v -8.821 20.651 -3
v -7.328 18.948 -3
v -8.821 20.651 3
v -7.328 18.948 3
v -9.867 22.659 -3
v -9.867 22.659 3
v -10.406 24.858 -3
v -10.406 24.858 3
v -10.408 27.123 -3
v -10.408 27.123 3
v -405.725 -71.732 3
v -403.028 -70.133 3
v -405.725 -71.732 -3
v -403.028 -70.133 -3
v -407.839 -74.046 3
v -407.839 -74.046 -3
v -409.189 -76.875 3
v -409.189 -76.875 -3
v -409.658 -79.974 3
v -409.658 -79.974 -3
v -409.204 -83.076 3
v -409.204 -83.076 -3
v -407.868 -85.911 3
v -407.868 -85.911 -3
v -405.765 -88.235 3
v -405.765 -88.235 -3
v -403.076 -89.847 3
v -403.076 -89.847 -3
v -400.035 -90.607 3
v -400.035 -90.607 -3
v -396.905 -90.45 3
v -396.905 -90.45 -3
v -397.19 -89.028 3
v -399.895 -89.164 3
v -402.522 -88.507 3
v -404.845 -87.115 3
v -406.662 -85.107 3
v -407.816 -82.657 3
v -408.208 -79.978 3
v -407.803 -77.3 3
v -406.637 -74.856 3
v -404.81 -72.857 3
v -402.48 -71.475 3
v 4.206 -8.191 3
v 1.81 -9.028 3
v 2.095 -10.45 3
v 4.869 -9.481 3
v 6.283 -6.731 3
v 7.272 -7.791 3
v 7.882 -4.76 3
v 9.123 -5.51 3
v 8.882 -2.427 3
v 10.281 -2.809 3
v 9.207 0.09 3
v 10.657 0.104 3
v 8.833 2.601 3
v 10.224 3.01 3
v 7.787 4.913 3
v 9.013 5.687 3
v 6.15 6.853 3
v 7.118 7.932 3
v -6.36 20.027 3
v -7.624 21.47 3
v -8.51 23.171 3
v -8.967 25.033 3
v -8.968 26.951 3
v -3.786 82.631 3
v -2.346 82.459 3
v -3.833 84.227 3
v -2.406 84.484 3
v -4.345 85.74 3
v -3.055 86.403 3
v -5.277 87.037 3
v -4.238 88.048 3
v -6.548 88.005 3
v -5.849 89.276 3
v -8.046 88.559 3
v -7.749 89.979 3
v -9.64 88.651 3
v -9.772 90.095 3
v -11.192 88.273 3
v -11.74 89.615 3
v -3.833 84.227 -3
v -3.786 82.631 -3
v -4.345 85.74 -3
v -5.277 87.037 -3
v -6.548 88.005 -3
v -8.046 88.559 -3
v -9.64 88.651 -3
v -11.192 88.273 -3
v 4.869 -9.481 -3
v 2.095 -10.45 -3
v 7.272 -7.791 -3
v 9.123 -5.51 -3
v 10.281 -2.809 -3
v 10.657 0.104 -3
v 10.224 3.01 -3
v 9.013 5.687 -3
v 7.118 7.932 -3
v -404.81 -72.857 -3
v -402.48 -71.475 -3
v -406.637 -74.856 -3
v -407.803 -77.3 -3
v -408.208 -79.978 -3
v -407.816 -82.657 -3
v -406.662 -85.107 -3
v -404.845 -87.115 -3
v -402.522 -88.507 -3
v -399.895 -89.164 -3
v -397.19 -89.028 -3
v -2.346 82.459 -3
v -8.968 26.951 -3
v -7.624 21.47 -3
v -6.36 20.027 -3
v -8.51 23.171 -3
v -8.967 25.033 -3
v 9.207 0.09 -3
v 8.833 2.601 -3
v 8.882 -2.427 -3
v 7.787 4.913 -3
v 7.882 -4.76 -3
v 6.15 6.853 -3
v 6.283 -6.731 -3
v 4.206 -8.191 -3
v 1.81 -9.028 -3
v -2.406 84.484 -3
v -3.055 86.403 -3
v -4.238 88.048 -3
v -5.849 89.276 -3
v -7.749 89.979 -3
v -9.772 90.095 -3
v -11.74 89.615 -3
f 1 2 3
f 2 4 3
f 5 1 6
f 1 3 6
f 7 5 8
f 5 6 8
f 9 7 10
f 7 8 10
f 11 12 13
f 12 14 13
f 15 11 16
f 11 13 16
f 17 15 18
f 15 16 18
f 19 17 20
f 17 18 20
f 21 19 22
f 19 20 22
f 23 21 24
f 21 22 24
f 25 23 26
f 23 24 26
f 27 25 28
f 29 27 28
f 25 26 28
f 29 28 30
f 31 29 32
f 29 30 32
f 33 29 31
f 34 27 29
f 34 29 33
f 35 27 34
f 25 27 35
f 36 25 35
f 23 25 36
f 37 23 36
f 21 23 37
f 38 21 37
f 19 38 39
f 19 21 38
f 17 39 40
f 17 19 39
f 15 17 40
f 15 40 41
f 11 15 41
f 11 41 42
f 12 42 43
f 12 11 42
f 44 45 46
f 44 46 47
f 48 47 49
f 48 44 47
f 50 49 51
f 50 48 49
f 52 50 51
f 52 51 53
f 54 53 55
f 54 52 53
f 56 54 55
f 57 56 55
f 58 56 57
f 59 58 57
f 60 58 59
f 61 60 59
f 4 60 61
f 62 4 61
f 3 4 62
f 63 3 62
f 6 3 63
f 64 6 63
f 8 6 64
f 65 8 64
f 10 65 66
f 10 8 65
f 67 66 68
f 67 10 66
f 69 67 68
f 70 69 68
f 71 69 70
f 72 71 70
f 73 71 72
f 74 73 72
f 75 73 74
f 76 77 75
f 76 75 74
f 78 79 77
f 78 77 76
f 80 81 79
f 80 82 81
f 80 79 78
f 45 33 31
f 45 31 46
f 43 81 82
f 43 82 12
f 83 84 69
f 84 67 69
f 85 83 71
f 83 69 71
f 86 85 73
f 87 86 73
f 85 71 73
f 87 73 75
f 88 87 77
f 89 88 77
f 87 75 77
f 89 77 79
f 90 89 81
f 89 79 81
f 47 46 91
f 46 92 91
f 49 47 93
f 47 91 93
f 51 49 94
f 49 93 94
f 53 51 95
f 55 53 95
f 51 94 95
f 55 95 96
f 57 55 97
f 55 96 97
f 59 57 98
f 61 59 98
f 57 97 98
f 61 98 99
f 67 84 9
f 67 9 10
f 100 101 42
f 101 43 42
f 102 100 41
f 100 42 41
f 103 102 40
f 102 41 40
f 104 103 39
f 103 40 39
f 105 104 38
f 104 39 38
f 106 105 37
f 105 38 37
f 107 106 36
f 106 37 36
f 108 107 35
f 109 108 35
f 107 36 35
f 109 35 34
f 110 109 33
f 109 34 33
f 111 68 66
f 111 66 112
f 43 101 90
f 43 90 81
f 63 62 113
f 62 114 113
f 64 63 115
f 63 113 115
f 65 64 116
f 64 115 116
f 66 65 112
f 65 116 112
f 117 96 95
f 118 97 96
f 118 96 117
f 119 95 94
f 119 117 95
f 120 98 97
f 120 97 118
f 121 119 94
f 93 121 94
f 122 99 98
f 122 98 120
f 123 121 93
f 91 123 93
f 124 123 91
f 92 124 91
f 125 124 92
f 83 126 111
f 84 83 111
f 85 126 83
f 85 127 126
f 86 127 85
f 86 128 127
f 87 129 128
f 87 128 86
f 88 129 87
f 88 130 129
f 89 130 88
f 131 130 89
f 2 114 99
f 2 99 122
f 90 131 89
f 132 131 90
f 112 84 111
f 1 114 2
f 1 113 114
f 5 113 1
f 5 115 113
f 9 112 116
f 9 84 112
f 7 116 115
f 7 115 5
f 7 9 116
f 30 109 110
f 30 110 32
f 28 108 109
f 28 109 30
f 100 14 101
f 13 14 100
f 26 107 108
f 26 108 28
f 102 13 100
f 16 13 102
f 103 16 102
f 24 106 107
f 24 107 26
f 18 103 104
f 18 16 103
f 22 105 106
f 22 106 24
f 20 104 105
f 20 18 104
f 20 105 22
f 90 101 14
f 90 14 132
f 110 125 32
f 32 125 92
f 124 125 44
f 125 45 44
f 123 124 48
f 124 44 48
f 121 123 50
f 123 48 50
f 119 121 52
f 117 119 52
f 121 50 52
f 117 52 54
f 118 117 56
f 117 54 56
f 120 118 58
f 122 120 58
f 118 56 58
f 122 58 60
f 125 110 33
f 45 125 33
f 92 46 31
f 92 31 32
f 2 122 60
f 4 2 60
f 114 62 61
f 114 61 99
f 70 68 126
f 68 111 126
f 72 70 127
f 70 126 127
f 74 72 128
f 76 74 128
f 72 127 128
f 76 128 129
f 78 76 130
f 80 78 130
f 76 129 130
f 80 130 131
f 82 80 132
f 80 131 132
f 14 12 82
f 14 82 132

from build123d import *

# Parameters (mm, degrees)
SKETCH4_W = 6
SKETCH4_H = 1.45


with BuildPart() as part:
    # Sweep1: sweep along a path in Sketch2
    with BuildLine(Plane.XY) as sweep1_path:
        Line((6.634008087, 7.392396345), (-6.844115698, 19.487795186))
        ThreePointArc((-6.844115698, 19.487795186), (-9.188071123, 22.914875813), (-9.688379476, 27.036610909))
        Line((-9.688379476, 27.036610909), (-3.065681286, 82.544917251))
        ThreePointArc((-3.065681286, 82.544917251), (-5.437015562, 88.14522378), (-11.466030466, 88.943746635))
        Line((-11.466030466, 88.943746635), (-402.754294044, -70.804193152))
        ThreePointArc((-402.754294044, -70.804193152), (-408.510077554, -82.86635865), (-397.047352934, -89.738827246))
        Line((-397.047352934, -89.738827246), (1.95264707, -9.738827262))
        ThreePointArc((1.95264707, -9.738827262), (9.58135519, -2.618247459), (6.634008087, 7.392396345))
    # Sketch4 → Sweep1 (sweep)
    with BuildSketch(Plane(origin=(0, 0, 0), x_dir=(0, 0, 1), z_dir=(0.9804860480377625, 0.1965886812695244, 0))):
        with Locations((0, 9.932652567)):
            Rectangle(SKETCH4_W, SKETCH4_H)
    sweep(path=sweep1_path.line)


solid = part.part
